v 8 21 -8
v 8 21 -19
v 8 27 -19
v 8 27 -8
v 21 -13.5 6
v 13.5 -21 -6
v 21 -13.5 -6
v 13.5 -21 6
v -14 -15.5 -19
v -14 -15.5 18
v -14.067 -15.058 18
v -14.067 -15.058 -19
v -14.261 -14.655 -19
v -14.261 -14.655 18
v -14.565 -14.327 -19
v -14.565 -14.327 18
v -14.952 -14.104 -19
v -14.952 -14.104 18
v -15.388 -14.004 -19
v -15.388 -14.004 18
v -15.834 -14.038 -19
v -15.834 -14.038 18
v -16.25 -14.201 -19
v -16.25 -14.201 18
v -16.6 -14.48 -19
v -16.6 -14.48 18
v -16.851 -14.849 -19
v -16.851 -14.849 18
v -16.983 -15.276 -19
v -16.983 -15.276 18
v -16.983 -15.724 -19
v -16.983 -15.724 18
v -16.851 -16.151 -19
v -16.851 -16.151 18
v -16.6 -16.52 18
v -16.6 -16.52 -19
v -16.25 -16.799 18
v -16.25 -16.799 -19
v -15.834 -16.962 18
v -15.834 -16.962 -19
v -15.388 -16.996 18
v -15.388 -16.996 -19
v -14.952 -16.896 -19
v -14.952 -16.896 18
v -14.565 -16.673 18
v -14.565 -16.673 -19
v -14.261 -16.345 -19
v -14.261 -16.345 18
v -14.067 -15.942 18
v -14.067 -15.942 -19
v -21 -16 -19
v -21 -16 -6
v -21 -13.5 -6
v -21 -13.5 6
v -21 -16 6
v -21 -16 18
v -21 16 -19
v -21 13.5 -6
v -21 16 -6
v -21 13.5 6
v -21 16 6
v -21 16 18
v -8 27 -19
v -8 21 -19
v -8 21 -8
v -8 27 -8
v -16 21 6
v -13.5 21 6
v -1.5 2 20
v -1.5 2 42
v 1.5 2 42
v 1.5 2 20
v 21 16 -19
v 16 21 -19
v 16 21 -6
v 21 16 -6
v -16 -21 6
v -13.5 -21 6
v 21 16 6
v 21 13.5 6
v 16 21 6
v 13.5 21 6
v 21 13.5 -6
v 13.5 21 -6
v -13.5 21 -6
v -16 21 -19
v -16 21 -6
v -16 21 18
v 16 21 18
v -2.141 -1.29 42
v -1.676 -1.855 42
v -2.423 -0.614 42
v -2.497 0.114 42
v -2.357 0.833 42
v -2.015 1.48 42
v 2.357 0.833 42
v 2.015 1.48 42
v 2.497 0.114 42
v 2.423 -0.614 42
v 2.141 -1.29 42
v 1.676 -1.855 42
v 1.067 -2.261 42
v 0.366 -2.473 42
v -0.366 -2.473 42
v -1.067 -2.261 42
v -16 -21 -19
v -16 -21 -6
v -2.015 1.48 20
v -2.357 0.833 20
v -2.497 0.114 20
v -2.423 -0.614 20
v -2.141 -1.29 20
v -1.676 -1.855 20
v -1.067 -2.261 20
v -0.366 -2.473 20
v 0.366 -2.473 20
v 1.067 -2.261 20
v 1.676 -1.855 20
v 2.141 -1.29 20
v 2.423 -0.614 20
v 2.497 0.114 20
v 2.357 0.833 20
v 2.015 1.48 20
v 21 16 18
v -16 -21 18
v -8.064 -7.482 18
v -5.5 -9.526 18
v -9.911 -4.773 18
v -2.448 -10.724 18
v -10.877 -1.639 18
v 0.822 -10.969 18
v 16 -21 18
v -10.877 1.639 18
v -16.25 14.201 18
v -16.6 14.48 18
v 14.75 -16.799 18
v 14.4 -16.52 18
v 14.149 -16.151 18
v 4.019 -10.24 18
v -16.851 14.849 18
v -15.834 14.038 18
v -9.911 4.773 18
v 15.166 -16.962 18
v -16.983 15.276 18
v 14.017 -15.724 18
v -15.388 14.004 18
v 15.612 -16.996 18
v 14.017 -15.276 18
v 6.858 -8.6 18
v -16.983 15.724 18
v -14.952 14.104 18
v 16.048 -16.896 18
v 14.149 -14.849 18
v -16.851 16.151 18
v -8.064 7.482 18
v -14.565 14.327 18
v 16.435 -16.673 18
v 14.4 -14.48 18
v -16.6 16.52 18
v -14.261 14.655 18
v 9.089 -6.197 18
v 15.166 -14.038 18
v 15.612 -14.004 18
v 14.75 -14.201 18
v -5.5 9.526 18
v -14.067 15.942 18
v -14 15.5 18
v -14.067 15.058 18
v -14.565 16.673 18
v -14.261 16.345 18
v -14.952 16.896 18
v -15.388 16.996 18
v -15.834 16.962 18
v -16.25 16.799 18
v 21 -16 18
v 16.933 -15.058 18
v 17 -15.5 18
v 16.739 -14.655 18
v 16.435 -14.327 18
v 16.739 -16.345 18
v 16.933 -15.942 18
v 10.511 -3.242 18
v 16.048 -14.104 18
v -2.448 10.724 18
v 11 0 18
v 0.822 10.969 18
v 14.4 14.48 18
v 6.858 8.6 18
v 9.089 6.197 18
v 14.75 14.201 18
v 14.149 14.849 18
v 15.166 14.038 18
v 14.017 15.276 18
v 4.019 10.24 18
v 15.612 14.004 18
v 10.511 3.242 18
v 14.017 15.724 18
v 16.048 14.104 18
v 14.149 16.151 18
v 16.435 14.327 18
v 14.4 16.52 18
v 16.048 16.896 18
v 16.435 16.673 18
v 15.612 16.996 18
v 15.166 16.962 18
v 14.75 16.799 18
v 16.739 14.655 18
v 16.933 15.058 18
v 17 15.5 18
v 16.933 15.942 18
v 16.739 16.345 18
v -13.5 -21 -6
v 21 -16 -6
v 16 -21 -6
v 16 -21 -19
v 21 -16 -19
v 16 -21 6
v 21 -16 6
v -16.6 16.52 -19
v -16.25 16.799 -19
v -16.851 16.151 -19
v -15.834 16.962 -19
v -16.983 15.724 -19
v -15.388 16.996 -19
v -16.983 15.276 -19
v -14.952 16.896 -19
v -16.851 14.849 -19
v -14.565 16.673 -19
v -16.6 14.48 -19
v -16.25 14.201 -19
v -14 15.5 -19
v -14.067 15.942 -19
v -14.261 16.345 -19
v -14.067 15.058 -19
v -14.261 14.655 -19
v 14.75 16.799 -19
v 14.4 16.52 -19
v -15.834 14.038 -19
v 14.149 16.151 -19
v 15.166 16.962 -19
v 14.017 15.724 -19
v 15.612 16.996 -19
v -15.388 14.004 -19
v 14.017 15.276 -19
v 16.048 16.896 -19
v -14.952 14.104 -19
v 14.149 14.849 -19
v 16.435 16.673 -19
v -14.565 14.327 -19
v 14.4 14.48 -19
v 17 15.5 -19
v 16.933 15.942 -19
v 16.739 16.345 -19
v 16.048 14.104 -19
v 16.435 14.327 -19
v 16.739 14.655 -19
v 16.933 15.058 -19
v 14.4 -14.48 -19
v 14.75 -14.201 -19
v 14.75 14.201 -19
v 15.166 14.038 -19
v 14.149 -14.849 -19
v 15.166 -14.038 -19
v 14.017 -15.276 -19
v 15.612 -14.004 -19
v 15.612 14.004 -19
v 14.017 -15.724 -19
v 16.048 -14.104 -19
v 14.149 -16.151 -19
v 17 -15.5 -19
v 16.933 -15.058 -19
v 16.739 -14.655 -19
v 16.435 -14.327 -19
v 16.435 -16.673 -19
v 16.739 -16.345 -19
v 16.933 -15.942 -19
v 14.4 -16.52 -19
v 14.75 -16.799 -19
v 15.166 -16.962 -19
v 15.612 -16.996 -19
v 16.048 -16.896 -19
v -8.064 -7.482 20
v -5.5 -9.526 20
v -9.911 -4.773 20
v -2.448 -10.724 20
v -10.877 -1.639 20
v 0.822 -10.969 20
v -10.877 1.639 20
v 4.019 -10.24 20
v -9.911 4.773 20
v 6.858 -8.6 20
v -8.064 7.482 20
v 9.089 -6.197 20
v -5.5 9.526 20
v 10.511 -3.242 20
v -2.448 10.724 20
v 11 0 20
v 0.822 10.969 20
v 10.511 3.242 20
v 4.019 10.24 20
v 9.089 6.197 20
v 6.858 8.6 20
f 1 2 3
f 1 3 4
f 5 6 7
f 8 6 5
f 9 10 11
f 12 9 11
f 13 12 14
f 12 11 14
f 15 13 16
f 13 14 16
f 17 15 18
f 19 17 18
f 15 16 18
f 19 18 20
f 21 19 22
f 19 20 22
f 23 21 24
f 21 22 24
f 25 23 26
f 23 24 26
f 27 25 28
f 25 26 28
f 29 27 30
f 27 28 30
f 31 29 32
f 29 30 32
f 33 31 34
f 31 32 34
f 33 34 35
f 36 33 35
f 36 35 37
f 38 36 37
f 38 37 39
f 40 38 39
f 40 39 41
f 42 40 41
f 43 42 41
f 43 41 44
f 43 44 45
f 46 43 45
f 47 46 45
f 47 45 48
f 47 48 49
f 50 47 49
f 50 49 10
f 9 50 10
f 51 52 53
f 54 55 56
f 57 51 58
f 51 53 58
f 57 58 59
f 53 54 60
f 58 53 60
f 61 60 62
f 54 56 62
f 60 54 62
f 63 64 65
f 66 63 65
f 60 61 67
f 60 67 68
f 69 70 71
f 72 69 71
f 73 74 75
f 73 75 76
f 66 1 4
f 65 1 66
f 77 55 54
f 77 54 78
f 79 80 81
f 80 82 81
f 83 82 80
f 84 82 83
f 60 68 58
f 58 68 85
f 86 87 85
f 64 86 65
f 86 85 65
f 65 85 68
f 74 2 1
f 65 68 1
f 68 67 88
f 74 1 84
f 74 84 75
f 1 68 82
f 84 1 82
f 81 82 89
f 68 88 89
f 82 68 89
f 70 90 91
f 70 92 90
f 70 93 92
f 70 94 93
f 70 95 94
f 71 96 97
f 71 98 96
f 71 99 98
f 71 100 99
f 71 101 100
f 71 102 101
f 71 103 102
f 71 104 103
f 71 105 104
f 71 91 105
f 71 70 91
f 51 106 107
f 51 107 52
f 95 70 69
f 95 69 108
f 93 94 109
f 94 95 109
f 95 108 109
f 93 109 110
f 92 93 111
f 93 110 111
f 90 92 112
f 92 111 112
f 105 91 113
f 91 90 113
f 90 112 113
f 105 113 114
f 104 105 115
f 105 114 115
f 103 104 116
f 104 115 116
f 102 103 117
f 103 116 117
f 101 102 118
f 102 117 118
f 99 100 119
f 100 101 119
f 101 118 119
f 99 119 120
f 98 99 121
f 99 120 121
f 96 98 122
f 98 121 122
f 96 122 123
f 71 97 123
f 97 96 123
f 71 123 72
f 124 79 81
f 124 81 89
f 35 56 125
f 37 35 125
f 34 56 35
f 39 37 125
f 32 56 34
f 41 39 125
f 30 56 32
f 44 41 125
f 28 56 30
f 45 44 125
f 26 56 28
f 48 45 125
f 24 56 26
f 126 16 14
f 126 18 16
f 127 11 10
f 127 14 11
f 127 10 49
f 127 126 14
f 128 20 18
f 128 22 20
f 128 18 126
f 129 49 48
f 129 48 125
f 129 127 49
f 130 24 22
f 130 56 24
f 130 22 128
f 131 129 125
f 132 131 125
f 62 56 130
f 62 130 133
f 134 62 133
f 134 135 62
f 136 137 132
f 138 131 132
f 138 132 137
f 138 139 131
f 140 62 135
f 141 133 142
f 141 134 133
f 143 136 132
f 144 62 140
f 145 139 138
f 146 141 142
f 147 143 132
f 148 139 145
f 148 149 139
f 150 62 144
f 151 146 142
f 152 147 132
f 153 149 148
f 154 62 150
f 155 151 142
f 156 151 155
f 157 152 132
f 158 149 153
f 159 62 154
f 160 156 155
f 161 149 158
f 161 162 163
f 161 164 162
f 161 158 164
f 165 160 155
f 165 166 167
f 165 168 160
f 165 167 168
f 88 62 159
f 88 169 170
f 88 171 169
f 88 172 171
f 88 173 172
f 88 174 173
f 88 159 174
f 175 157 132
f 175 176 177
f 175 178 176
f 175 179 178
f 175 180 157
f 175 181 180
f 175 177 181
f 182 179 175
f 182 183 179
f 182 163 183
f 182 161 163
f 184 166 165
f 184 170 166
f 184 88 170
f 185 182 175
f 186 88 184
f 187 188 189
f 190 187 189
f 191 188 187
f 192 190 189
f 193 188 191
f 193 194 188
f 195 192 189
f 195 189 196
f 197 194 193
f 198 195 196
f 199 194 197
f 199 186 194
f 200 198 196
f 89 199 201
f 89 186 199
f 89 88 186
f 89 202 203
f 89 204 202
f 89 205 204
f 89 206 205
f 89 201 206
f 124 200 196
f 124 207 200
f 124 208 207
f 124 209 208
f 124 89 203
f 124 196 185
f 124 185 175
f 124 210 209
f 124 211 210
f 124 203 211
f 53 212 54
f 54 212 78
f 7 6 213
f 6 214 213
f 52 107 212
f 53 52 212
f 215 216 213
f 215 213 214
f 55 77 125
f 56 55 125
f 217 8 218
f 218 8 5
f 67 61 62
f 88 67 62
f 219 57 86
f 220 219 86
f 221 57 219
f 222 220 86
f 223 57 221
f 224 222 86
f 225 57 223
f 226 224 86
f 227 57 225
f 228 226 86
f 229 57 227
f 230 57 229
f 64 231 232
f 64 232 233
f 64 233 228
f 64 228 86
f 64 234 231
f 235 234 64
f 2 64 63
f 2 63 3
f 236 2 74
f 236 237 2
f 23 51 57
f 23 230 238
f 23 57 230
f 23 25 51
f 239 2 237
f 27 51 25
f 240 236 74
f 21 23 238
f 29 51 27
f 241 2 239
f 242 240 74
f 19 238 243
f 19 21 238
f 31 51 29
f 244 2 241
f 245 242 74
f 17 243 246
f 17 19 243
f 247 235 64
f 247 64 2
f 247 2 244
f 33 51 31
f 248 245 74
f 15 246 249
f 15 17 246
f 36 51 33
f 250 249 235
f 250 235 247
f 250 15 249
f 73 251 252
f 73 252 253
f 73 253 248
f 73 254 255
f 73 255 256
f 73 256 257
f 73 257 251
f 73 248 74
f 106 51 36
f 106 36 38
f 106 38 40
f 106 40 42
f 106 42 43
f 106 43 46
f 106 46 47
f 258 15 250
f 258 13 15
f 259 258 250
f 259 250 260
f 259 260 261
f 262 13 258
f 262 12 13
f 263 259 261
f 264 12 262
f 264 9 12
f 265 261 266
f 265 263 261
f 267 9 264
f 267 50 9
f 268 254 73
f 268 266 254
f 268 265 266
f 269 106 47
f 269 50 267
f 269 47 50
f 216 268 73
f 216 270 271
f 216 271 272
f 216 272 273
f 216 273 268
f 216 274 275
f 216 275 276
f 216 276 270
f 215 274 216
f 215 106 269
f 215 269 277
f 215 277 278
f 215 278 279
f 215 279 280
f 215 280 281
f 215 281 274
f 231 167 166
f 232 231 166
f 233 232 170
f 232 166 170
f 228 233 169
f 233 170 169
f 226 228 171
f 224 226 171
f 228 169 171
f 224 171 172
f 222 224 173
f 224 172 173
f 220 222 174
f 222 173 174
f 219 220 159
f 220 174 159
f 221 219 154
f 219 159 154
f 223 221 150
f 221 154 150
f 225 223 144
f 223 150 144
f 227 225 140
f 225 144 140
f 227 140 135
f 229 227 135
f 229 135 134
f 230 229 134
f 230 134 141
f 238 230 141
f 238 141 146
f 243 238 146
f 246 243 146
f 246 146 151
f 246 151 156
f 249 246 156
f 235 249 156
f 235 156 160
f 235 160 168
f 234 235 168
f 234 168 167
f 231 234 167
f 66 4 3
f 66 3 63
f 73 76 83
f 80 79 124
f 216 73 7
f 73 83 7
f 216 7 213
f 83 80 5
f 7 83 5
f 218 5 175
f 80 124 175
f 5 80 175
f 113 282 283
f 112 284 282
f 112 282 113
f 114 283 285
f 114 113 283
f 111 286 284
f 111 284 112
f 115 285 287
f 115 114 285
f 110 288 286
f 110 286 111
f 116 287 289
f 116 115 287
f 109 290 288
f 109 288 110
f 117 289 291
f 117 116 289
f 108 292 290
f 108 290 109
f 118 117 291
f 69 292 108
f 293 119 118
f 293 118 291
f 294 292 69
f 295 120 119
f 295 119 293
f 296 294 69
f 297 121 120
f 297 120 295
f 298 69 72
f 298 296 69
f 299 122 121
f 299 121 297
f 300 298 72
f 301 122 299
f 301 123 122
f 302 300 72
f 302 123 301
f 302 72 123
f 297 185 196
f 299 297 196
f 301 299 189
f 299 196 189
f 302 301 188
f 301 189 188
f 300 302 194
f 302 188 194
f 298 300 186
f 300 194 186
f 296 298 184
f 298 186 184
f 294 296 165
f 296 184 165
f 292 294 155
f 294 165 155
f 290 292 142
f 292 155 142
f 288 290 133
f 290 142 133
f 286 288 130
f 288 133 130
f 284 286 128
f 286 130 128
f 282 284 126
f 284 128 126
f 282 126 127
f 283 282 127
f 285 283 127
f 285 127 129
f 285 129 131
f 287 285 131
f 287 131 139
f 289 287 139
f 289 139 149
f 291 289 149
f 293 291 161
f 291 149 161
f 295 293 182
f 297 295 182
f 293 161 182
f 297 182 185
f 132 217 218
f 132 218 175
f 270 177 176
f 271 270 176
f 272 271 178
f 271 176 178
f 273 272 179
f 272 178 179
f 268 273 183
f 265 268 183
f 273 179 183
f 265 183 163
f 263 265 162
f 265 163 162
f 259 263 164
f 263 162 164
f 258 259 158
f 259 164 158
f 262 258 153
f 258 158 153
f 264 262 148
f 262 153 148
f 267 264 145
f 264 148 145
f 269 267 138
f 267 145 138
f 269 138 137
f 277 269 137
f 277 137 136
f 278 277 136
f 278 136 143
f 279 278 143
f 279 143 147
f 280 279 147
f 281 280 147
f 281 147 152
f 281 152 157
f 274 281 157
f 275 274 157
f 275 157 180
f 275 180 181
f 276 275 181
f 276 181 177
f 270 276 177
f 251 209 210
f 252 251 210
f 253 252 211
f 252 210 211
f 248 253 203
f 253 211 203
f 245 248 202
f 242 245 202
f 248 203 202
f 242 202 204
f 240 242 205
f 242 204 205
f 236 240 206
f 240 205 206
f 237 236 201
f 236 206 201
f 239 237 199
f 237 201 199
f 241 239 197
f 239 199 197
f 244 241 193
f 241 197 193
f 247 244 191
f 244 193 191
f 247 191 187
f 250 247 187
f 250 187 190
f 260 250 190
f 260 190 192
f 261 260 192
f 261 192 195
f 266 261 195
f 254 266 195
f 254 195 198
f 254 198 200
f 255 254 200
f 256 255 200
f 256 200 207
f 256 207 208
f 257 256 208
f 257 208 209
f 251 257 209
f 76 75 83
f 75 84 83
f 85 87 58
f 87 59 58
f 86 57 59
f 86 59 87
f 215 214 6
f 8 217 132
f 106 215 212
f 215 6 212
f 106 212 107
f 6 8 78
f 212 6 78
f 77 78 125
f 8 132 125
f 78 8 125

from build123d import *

# Parameters (mm, degrees)
F0_W      = 42
F0_H      = 42
F1_DEPTH  = 6
F2_SIZE   = 7.5
F4_DEPTH  = 12
F5_SIZE   = 5
F7_DEPTH  = 13
F8_R      = 11
F9_DEPTH  = 2
F10_R     = 2.5
F11_DEPTH = 22
F12_W     = 5.2537292178
F12_H     = 0.9334036984
F13_DEPTH = 22
F14_R     = 1.5
F15_DEPTH = 37.001
F16_W     = 16
F16_H     = 11
F17_DEPTH = 6


with BuildPart() as f1:
    # F0 (on Top) → F1 (new body, symmetric)
    with BuildSketch(Plane.XY):
        Rectangle(F0_W, F0_H)
    extrude(amount=F1_DEPTH, both=True)

    # F2
    f2_edges = [f1.edges().sort_by_distance(p)[0] for p in [
        (21, 21, 0),
        (-21, 21, 0),
        (-21, -21, 0),
        (21, -21, 0),
    ]]
    chamfer(f2_edges, length=F2_SIZE)

    # F3 (on face) → F4 (join)
    with BuildSketch(Plane.XY.offset(6)):
        Polygon((13.5, 21), (-13.5, 21), (-21, 13.5), (-21, -13.5), (-13.5, -21), (13.5, -21), (21, -13.5), (21, 13.5), align=None)
        Polygon((21, 21), (13.5, 21), (21, 13.5), align=None)
        Polygon((-13.5, 21), (-21, 21), (-21, 13.5), align=None)
        Polygon((-13.5, -21), (-21, -13.5), (-21, -21), align=None)
        Polygon((21, -21), (21, -13.5), (13.5, -21), align=None)
    extrude(amount=F4_DEPTH)

    # F5
    f5_edges = [f1.edges().sort_by_distance(p)[0] for p in [
        (21, -21, 12),
        (-21, -21, 12),
        (-21, 21, 12),
        (21, 21, 12),
    ]]
    chamfer(f5_edges, length=F5_SIZE)

    # F6 (on face) → F7 (join)
    with BuildSketch(Plane(origin=(0, 0, -6), x_dir=(1, 0, 0), z_dir=(0, 0, -1))):
        Polygon((21, -16), (21, 16), (16, 21), (-16, 21), (-21, 16), (-21, -16), (-16, -21), (16, -21), align=None)
    extrude(amount=F7_DEPTH)

    # F8 (on face) → F9 (join)
    with BuildSketch(Plane.XY.offset(18)):
        Circle(F8_R)
    extrude(amount=F9_DEPTH)

    # F10 (on face) → F11 (join)
    with BuildSketch(Plane.XY.offset(20)):
        Circle(F10_R)
    extrude(amount=F11_DEPTH)

    # F12 (on face) → F13 (cut)
    with BuildSketch(Plane.XY.offset(42)):
        with Locations((-0.0065014465, 2.4667018492)):
            Rectangle(F12_W, F12_H)
    extrude(amount=-F13_DEPTH, mode=Mode.SUBTRACT)

    # F14 (on face) → F15 (cut, through all)
    with BuildSketch(Plane.XY.offset(18)):
        with Locations((-15.5, 15.5)):
            Circle(F14_R)
        with Locations((15.5, 15.5)):
            Circle(F14_R)
        with Locations((-15.5, -15.5)):
            Circle(F14_R)
        with Locations((15.5, -15.5)):
            Circle(F14_R)
    extrude(amount=-F15_DEPTH, mode=Mode.SUBTRACT)

    # F16 (on face) → F17 (join)
    with BuildSketch(Plane(origin=(0, 21, 0), x_dir=(-1, 0, 0), z_dir=(0, 1, 0))):
        with Locations((0, -13.5)):
            Rectangle(F16_W, F16_H)
    extrude(amount=F17_DEPTH)


solid = f1.part
